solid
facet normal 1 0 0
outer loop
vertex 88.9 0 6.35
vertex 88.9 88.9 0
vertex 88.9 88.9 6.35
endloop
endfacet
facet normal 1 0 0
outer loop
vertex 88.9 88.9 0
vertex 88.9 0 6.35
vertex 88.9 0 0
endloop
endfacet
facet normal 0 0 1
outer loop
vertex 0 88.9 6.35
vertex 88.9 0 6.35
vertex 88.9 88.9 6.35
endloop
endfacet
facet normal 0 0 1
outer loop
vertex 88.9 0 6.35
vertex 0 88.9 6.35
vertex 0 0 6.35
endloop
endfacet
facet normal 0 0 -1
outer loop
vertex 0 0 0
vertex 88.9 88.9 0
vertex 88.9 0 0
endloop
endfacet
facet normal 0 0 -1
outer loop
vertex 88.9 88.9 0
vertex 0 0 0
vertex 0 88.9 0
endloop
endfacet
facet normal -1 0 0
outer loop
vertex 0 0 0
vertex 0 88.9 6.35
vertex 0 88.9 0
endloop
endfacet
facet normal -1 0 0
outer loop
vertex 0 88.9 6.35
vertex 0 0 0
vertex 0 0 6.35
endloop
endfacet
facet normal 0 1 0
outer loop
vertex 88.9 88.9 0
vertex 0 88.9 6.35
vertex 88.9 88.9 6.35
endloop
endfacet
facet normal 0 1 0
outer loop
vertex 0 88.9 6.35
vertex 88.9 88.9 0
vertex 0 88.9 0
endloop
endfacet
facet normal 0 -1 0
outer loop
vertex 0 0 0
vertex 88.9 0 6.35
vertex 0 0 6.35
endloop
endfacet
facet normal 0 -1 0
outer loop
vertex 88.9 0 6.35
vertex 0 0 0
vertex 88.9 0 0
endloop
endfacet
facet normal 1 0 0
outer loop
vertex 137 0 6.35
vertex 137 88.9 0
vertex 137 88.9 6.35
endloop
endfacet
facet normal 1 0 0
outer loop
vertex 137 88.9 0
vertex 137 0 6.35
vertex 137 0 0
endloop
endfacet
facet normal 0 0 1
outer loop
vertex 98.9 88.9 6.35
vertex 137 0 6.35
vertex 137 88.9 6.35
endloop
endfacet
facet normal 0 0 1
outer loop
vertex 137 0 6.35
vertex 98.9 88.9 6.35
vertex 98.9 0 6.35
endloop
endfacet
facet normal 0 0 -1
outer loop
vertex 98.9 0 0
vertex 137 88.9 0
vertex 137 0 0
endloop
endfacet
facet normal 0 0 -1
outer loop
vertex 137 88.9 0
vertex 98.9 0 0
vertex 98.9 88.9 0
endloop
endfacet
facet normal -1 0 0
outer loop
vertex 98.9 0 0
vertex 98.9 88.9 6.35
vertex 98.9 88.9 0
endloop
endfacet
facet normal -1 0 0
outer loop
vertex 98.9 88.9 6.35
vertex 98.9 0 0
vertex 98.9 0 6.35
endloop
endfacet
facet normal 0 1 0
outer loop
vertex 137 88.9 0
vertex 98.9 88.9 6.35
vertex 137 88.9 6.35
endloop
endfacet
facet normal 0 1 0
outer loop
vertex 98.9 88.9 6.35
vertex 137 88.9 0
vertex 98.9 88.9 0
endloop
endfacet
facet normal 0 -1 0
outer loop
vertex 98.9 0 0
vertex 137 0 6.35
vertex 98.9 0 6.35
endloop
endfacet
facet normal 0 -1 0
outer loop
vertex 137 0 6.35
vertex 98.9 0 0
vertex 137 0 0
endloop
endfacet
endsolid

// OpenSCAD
inch = 25.4;

module shim(w_in, d_in, h_in) {
    cube([w_in * inch, d_in * inch, h_in * inch]);
}

translate([0, 0, 0])
    shim(3.5, 3.5, 0.25);

translate([3.5 * inch + 10, 0, 0])
    shim(1.5, 3.5, 0.25);
